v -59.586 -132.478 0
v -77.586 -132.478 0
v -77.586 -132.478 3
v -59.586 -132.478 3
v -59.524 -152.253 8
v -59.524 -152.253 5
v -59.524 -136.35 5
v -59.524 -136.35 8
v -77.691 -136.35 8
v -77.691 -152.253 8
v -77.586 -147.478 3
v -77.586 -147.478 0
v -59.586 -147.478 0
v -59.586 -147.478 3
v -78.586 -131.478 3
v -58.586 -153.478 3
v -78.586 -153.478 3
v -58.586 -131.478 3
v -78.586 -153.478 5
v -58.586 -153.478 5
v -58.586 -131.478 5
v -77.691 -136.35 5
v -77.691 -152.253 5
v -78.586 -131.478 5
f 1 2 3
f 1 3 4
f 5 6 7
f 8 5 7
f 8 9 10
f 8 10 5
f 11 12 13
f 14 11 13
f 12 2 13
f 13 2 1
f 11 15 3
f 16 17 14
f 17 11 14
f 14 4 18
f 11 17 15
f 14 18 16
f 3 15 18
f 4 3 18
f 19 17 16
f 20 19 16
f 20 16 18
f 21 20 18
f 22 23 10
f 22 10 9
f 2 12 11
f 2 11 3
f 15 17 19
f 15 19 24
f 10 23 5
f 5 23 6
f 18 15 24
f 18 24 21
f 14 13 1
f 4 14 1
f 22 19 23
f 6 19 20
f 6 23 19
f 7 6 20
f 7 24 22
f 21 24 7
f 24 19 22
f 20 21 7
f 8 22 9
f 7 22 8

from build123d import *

# Parameters (mm, degrees)
SKETCH1_W           = 18
SKETCH1_H           = 15
BOSS_EXTRUDE1_DEPTH = 3
SKETCH2_W           = 20
SKETCH2_H           = 22
BOSS_EXTRUDE2_DEPTH = 2
SKETCH3_W           = 18.166927201
SKETCH3_H           = 15.903506762
BOSS_EXTRUDE3_DEPTH = 3


with BuildPart() as part:
    # Sketch1 → Boss-Extrude1 (new body)
    with BuildSketch(Plane.XY):
        with Locations((-68.585871194, -139.978474406)):
            Rectangle(SKETCH1_W, SKETCH1_H)
    extrude(amount=BOSS_EXTRUDE1_DEPTH)

    # Sketch2 → Boss-Extrude2 (add)
    with BuildSketch(Plane.XY.offset(3)):
        with Locations((-68.585871194, -142.478474406)):
            Rectangle(SKETCH2_W, SKETCH2_H)
    extrude(amount=BOSS_EXTRUDE2_DEPTH)

    # Sketch3 → Boss-Extrude3 (add)
    with BuildSketch(Plane.XY.offset(5)):
        with Locations((-68.607051799, -144.301260384)):
            Rectangle(SKETCH3_W, SKETCH3_H)
    extrude(amount=BOSS_EXTRUDE3_DEPTH)


solid = part.part
